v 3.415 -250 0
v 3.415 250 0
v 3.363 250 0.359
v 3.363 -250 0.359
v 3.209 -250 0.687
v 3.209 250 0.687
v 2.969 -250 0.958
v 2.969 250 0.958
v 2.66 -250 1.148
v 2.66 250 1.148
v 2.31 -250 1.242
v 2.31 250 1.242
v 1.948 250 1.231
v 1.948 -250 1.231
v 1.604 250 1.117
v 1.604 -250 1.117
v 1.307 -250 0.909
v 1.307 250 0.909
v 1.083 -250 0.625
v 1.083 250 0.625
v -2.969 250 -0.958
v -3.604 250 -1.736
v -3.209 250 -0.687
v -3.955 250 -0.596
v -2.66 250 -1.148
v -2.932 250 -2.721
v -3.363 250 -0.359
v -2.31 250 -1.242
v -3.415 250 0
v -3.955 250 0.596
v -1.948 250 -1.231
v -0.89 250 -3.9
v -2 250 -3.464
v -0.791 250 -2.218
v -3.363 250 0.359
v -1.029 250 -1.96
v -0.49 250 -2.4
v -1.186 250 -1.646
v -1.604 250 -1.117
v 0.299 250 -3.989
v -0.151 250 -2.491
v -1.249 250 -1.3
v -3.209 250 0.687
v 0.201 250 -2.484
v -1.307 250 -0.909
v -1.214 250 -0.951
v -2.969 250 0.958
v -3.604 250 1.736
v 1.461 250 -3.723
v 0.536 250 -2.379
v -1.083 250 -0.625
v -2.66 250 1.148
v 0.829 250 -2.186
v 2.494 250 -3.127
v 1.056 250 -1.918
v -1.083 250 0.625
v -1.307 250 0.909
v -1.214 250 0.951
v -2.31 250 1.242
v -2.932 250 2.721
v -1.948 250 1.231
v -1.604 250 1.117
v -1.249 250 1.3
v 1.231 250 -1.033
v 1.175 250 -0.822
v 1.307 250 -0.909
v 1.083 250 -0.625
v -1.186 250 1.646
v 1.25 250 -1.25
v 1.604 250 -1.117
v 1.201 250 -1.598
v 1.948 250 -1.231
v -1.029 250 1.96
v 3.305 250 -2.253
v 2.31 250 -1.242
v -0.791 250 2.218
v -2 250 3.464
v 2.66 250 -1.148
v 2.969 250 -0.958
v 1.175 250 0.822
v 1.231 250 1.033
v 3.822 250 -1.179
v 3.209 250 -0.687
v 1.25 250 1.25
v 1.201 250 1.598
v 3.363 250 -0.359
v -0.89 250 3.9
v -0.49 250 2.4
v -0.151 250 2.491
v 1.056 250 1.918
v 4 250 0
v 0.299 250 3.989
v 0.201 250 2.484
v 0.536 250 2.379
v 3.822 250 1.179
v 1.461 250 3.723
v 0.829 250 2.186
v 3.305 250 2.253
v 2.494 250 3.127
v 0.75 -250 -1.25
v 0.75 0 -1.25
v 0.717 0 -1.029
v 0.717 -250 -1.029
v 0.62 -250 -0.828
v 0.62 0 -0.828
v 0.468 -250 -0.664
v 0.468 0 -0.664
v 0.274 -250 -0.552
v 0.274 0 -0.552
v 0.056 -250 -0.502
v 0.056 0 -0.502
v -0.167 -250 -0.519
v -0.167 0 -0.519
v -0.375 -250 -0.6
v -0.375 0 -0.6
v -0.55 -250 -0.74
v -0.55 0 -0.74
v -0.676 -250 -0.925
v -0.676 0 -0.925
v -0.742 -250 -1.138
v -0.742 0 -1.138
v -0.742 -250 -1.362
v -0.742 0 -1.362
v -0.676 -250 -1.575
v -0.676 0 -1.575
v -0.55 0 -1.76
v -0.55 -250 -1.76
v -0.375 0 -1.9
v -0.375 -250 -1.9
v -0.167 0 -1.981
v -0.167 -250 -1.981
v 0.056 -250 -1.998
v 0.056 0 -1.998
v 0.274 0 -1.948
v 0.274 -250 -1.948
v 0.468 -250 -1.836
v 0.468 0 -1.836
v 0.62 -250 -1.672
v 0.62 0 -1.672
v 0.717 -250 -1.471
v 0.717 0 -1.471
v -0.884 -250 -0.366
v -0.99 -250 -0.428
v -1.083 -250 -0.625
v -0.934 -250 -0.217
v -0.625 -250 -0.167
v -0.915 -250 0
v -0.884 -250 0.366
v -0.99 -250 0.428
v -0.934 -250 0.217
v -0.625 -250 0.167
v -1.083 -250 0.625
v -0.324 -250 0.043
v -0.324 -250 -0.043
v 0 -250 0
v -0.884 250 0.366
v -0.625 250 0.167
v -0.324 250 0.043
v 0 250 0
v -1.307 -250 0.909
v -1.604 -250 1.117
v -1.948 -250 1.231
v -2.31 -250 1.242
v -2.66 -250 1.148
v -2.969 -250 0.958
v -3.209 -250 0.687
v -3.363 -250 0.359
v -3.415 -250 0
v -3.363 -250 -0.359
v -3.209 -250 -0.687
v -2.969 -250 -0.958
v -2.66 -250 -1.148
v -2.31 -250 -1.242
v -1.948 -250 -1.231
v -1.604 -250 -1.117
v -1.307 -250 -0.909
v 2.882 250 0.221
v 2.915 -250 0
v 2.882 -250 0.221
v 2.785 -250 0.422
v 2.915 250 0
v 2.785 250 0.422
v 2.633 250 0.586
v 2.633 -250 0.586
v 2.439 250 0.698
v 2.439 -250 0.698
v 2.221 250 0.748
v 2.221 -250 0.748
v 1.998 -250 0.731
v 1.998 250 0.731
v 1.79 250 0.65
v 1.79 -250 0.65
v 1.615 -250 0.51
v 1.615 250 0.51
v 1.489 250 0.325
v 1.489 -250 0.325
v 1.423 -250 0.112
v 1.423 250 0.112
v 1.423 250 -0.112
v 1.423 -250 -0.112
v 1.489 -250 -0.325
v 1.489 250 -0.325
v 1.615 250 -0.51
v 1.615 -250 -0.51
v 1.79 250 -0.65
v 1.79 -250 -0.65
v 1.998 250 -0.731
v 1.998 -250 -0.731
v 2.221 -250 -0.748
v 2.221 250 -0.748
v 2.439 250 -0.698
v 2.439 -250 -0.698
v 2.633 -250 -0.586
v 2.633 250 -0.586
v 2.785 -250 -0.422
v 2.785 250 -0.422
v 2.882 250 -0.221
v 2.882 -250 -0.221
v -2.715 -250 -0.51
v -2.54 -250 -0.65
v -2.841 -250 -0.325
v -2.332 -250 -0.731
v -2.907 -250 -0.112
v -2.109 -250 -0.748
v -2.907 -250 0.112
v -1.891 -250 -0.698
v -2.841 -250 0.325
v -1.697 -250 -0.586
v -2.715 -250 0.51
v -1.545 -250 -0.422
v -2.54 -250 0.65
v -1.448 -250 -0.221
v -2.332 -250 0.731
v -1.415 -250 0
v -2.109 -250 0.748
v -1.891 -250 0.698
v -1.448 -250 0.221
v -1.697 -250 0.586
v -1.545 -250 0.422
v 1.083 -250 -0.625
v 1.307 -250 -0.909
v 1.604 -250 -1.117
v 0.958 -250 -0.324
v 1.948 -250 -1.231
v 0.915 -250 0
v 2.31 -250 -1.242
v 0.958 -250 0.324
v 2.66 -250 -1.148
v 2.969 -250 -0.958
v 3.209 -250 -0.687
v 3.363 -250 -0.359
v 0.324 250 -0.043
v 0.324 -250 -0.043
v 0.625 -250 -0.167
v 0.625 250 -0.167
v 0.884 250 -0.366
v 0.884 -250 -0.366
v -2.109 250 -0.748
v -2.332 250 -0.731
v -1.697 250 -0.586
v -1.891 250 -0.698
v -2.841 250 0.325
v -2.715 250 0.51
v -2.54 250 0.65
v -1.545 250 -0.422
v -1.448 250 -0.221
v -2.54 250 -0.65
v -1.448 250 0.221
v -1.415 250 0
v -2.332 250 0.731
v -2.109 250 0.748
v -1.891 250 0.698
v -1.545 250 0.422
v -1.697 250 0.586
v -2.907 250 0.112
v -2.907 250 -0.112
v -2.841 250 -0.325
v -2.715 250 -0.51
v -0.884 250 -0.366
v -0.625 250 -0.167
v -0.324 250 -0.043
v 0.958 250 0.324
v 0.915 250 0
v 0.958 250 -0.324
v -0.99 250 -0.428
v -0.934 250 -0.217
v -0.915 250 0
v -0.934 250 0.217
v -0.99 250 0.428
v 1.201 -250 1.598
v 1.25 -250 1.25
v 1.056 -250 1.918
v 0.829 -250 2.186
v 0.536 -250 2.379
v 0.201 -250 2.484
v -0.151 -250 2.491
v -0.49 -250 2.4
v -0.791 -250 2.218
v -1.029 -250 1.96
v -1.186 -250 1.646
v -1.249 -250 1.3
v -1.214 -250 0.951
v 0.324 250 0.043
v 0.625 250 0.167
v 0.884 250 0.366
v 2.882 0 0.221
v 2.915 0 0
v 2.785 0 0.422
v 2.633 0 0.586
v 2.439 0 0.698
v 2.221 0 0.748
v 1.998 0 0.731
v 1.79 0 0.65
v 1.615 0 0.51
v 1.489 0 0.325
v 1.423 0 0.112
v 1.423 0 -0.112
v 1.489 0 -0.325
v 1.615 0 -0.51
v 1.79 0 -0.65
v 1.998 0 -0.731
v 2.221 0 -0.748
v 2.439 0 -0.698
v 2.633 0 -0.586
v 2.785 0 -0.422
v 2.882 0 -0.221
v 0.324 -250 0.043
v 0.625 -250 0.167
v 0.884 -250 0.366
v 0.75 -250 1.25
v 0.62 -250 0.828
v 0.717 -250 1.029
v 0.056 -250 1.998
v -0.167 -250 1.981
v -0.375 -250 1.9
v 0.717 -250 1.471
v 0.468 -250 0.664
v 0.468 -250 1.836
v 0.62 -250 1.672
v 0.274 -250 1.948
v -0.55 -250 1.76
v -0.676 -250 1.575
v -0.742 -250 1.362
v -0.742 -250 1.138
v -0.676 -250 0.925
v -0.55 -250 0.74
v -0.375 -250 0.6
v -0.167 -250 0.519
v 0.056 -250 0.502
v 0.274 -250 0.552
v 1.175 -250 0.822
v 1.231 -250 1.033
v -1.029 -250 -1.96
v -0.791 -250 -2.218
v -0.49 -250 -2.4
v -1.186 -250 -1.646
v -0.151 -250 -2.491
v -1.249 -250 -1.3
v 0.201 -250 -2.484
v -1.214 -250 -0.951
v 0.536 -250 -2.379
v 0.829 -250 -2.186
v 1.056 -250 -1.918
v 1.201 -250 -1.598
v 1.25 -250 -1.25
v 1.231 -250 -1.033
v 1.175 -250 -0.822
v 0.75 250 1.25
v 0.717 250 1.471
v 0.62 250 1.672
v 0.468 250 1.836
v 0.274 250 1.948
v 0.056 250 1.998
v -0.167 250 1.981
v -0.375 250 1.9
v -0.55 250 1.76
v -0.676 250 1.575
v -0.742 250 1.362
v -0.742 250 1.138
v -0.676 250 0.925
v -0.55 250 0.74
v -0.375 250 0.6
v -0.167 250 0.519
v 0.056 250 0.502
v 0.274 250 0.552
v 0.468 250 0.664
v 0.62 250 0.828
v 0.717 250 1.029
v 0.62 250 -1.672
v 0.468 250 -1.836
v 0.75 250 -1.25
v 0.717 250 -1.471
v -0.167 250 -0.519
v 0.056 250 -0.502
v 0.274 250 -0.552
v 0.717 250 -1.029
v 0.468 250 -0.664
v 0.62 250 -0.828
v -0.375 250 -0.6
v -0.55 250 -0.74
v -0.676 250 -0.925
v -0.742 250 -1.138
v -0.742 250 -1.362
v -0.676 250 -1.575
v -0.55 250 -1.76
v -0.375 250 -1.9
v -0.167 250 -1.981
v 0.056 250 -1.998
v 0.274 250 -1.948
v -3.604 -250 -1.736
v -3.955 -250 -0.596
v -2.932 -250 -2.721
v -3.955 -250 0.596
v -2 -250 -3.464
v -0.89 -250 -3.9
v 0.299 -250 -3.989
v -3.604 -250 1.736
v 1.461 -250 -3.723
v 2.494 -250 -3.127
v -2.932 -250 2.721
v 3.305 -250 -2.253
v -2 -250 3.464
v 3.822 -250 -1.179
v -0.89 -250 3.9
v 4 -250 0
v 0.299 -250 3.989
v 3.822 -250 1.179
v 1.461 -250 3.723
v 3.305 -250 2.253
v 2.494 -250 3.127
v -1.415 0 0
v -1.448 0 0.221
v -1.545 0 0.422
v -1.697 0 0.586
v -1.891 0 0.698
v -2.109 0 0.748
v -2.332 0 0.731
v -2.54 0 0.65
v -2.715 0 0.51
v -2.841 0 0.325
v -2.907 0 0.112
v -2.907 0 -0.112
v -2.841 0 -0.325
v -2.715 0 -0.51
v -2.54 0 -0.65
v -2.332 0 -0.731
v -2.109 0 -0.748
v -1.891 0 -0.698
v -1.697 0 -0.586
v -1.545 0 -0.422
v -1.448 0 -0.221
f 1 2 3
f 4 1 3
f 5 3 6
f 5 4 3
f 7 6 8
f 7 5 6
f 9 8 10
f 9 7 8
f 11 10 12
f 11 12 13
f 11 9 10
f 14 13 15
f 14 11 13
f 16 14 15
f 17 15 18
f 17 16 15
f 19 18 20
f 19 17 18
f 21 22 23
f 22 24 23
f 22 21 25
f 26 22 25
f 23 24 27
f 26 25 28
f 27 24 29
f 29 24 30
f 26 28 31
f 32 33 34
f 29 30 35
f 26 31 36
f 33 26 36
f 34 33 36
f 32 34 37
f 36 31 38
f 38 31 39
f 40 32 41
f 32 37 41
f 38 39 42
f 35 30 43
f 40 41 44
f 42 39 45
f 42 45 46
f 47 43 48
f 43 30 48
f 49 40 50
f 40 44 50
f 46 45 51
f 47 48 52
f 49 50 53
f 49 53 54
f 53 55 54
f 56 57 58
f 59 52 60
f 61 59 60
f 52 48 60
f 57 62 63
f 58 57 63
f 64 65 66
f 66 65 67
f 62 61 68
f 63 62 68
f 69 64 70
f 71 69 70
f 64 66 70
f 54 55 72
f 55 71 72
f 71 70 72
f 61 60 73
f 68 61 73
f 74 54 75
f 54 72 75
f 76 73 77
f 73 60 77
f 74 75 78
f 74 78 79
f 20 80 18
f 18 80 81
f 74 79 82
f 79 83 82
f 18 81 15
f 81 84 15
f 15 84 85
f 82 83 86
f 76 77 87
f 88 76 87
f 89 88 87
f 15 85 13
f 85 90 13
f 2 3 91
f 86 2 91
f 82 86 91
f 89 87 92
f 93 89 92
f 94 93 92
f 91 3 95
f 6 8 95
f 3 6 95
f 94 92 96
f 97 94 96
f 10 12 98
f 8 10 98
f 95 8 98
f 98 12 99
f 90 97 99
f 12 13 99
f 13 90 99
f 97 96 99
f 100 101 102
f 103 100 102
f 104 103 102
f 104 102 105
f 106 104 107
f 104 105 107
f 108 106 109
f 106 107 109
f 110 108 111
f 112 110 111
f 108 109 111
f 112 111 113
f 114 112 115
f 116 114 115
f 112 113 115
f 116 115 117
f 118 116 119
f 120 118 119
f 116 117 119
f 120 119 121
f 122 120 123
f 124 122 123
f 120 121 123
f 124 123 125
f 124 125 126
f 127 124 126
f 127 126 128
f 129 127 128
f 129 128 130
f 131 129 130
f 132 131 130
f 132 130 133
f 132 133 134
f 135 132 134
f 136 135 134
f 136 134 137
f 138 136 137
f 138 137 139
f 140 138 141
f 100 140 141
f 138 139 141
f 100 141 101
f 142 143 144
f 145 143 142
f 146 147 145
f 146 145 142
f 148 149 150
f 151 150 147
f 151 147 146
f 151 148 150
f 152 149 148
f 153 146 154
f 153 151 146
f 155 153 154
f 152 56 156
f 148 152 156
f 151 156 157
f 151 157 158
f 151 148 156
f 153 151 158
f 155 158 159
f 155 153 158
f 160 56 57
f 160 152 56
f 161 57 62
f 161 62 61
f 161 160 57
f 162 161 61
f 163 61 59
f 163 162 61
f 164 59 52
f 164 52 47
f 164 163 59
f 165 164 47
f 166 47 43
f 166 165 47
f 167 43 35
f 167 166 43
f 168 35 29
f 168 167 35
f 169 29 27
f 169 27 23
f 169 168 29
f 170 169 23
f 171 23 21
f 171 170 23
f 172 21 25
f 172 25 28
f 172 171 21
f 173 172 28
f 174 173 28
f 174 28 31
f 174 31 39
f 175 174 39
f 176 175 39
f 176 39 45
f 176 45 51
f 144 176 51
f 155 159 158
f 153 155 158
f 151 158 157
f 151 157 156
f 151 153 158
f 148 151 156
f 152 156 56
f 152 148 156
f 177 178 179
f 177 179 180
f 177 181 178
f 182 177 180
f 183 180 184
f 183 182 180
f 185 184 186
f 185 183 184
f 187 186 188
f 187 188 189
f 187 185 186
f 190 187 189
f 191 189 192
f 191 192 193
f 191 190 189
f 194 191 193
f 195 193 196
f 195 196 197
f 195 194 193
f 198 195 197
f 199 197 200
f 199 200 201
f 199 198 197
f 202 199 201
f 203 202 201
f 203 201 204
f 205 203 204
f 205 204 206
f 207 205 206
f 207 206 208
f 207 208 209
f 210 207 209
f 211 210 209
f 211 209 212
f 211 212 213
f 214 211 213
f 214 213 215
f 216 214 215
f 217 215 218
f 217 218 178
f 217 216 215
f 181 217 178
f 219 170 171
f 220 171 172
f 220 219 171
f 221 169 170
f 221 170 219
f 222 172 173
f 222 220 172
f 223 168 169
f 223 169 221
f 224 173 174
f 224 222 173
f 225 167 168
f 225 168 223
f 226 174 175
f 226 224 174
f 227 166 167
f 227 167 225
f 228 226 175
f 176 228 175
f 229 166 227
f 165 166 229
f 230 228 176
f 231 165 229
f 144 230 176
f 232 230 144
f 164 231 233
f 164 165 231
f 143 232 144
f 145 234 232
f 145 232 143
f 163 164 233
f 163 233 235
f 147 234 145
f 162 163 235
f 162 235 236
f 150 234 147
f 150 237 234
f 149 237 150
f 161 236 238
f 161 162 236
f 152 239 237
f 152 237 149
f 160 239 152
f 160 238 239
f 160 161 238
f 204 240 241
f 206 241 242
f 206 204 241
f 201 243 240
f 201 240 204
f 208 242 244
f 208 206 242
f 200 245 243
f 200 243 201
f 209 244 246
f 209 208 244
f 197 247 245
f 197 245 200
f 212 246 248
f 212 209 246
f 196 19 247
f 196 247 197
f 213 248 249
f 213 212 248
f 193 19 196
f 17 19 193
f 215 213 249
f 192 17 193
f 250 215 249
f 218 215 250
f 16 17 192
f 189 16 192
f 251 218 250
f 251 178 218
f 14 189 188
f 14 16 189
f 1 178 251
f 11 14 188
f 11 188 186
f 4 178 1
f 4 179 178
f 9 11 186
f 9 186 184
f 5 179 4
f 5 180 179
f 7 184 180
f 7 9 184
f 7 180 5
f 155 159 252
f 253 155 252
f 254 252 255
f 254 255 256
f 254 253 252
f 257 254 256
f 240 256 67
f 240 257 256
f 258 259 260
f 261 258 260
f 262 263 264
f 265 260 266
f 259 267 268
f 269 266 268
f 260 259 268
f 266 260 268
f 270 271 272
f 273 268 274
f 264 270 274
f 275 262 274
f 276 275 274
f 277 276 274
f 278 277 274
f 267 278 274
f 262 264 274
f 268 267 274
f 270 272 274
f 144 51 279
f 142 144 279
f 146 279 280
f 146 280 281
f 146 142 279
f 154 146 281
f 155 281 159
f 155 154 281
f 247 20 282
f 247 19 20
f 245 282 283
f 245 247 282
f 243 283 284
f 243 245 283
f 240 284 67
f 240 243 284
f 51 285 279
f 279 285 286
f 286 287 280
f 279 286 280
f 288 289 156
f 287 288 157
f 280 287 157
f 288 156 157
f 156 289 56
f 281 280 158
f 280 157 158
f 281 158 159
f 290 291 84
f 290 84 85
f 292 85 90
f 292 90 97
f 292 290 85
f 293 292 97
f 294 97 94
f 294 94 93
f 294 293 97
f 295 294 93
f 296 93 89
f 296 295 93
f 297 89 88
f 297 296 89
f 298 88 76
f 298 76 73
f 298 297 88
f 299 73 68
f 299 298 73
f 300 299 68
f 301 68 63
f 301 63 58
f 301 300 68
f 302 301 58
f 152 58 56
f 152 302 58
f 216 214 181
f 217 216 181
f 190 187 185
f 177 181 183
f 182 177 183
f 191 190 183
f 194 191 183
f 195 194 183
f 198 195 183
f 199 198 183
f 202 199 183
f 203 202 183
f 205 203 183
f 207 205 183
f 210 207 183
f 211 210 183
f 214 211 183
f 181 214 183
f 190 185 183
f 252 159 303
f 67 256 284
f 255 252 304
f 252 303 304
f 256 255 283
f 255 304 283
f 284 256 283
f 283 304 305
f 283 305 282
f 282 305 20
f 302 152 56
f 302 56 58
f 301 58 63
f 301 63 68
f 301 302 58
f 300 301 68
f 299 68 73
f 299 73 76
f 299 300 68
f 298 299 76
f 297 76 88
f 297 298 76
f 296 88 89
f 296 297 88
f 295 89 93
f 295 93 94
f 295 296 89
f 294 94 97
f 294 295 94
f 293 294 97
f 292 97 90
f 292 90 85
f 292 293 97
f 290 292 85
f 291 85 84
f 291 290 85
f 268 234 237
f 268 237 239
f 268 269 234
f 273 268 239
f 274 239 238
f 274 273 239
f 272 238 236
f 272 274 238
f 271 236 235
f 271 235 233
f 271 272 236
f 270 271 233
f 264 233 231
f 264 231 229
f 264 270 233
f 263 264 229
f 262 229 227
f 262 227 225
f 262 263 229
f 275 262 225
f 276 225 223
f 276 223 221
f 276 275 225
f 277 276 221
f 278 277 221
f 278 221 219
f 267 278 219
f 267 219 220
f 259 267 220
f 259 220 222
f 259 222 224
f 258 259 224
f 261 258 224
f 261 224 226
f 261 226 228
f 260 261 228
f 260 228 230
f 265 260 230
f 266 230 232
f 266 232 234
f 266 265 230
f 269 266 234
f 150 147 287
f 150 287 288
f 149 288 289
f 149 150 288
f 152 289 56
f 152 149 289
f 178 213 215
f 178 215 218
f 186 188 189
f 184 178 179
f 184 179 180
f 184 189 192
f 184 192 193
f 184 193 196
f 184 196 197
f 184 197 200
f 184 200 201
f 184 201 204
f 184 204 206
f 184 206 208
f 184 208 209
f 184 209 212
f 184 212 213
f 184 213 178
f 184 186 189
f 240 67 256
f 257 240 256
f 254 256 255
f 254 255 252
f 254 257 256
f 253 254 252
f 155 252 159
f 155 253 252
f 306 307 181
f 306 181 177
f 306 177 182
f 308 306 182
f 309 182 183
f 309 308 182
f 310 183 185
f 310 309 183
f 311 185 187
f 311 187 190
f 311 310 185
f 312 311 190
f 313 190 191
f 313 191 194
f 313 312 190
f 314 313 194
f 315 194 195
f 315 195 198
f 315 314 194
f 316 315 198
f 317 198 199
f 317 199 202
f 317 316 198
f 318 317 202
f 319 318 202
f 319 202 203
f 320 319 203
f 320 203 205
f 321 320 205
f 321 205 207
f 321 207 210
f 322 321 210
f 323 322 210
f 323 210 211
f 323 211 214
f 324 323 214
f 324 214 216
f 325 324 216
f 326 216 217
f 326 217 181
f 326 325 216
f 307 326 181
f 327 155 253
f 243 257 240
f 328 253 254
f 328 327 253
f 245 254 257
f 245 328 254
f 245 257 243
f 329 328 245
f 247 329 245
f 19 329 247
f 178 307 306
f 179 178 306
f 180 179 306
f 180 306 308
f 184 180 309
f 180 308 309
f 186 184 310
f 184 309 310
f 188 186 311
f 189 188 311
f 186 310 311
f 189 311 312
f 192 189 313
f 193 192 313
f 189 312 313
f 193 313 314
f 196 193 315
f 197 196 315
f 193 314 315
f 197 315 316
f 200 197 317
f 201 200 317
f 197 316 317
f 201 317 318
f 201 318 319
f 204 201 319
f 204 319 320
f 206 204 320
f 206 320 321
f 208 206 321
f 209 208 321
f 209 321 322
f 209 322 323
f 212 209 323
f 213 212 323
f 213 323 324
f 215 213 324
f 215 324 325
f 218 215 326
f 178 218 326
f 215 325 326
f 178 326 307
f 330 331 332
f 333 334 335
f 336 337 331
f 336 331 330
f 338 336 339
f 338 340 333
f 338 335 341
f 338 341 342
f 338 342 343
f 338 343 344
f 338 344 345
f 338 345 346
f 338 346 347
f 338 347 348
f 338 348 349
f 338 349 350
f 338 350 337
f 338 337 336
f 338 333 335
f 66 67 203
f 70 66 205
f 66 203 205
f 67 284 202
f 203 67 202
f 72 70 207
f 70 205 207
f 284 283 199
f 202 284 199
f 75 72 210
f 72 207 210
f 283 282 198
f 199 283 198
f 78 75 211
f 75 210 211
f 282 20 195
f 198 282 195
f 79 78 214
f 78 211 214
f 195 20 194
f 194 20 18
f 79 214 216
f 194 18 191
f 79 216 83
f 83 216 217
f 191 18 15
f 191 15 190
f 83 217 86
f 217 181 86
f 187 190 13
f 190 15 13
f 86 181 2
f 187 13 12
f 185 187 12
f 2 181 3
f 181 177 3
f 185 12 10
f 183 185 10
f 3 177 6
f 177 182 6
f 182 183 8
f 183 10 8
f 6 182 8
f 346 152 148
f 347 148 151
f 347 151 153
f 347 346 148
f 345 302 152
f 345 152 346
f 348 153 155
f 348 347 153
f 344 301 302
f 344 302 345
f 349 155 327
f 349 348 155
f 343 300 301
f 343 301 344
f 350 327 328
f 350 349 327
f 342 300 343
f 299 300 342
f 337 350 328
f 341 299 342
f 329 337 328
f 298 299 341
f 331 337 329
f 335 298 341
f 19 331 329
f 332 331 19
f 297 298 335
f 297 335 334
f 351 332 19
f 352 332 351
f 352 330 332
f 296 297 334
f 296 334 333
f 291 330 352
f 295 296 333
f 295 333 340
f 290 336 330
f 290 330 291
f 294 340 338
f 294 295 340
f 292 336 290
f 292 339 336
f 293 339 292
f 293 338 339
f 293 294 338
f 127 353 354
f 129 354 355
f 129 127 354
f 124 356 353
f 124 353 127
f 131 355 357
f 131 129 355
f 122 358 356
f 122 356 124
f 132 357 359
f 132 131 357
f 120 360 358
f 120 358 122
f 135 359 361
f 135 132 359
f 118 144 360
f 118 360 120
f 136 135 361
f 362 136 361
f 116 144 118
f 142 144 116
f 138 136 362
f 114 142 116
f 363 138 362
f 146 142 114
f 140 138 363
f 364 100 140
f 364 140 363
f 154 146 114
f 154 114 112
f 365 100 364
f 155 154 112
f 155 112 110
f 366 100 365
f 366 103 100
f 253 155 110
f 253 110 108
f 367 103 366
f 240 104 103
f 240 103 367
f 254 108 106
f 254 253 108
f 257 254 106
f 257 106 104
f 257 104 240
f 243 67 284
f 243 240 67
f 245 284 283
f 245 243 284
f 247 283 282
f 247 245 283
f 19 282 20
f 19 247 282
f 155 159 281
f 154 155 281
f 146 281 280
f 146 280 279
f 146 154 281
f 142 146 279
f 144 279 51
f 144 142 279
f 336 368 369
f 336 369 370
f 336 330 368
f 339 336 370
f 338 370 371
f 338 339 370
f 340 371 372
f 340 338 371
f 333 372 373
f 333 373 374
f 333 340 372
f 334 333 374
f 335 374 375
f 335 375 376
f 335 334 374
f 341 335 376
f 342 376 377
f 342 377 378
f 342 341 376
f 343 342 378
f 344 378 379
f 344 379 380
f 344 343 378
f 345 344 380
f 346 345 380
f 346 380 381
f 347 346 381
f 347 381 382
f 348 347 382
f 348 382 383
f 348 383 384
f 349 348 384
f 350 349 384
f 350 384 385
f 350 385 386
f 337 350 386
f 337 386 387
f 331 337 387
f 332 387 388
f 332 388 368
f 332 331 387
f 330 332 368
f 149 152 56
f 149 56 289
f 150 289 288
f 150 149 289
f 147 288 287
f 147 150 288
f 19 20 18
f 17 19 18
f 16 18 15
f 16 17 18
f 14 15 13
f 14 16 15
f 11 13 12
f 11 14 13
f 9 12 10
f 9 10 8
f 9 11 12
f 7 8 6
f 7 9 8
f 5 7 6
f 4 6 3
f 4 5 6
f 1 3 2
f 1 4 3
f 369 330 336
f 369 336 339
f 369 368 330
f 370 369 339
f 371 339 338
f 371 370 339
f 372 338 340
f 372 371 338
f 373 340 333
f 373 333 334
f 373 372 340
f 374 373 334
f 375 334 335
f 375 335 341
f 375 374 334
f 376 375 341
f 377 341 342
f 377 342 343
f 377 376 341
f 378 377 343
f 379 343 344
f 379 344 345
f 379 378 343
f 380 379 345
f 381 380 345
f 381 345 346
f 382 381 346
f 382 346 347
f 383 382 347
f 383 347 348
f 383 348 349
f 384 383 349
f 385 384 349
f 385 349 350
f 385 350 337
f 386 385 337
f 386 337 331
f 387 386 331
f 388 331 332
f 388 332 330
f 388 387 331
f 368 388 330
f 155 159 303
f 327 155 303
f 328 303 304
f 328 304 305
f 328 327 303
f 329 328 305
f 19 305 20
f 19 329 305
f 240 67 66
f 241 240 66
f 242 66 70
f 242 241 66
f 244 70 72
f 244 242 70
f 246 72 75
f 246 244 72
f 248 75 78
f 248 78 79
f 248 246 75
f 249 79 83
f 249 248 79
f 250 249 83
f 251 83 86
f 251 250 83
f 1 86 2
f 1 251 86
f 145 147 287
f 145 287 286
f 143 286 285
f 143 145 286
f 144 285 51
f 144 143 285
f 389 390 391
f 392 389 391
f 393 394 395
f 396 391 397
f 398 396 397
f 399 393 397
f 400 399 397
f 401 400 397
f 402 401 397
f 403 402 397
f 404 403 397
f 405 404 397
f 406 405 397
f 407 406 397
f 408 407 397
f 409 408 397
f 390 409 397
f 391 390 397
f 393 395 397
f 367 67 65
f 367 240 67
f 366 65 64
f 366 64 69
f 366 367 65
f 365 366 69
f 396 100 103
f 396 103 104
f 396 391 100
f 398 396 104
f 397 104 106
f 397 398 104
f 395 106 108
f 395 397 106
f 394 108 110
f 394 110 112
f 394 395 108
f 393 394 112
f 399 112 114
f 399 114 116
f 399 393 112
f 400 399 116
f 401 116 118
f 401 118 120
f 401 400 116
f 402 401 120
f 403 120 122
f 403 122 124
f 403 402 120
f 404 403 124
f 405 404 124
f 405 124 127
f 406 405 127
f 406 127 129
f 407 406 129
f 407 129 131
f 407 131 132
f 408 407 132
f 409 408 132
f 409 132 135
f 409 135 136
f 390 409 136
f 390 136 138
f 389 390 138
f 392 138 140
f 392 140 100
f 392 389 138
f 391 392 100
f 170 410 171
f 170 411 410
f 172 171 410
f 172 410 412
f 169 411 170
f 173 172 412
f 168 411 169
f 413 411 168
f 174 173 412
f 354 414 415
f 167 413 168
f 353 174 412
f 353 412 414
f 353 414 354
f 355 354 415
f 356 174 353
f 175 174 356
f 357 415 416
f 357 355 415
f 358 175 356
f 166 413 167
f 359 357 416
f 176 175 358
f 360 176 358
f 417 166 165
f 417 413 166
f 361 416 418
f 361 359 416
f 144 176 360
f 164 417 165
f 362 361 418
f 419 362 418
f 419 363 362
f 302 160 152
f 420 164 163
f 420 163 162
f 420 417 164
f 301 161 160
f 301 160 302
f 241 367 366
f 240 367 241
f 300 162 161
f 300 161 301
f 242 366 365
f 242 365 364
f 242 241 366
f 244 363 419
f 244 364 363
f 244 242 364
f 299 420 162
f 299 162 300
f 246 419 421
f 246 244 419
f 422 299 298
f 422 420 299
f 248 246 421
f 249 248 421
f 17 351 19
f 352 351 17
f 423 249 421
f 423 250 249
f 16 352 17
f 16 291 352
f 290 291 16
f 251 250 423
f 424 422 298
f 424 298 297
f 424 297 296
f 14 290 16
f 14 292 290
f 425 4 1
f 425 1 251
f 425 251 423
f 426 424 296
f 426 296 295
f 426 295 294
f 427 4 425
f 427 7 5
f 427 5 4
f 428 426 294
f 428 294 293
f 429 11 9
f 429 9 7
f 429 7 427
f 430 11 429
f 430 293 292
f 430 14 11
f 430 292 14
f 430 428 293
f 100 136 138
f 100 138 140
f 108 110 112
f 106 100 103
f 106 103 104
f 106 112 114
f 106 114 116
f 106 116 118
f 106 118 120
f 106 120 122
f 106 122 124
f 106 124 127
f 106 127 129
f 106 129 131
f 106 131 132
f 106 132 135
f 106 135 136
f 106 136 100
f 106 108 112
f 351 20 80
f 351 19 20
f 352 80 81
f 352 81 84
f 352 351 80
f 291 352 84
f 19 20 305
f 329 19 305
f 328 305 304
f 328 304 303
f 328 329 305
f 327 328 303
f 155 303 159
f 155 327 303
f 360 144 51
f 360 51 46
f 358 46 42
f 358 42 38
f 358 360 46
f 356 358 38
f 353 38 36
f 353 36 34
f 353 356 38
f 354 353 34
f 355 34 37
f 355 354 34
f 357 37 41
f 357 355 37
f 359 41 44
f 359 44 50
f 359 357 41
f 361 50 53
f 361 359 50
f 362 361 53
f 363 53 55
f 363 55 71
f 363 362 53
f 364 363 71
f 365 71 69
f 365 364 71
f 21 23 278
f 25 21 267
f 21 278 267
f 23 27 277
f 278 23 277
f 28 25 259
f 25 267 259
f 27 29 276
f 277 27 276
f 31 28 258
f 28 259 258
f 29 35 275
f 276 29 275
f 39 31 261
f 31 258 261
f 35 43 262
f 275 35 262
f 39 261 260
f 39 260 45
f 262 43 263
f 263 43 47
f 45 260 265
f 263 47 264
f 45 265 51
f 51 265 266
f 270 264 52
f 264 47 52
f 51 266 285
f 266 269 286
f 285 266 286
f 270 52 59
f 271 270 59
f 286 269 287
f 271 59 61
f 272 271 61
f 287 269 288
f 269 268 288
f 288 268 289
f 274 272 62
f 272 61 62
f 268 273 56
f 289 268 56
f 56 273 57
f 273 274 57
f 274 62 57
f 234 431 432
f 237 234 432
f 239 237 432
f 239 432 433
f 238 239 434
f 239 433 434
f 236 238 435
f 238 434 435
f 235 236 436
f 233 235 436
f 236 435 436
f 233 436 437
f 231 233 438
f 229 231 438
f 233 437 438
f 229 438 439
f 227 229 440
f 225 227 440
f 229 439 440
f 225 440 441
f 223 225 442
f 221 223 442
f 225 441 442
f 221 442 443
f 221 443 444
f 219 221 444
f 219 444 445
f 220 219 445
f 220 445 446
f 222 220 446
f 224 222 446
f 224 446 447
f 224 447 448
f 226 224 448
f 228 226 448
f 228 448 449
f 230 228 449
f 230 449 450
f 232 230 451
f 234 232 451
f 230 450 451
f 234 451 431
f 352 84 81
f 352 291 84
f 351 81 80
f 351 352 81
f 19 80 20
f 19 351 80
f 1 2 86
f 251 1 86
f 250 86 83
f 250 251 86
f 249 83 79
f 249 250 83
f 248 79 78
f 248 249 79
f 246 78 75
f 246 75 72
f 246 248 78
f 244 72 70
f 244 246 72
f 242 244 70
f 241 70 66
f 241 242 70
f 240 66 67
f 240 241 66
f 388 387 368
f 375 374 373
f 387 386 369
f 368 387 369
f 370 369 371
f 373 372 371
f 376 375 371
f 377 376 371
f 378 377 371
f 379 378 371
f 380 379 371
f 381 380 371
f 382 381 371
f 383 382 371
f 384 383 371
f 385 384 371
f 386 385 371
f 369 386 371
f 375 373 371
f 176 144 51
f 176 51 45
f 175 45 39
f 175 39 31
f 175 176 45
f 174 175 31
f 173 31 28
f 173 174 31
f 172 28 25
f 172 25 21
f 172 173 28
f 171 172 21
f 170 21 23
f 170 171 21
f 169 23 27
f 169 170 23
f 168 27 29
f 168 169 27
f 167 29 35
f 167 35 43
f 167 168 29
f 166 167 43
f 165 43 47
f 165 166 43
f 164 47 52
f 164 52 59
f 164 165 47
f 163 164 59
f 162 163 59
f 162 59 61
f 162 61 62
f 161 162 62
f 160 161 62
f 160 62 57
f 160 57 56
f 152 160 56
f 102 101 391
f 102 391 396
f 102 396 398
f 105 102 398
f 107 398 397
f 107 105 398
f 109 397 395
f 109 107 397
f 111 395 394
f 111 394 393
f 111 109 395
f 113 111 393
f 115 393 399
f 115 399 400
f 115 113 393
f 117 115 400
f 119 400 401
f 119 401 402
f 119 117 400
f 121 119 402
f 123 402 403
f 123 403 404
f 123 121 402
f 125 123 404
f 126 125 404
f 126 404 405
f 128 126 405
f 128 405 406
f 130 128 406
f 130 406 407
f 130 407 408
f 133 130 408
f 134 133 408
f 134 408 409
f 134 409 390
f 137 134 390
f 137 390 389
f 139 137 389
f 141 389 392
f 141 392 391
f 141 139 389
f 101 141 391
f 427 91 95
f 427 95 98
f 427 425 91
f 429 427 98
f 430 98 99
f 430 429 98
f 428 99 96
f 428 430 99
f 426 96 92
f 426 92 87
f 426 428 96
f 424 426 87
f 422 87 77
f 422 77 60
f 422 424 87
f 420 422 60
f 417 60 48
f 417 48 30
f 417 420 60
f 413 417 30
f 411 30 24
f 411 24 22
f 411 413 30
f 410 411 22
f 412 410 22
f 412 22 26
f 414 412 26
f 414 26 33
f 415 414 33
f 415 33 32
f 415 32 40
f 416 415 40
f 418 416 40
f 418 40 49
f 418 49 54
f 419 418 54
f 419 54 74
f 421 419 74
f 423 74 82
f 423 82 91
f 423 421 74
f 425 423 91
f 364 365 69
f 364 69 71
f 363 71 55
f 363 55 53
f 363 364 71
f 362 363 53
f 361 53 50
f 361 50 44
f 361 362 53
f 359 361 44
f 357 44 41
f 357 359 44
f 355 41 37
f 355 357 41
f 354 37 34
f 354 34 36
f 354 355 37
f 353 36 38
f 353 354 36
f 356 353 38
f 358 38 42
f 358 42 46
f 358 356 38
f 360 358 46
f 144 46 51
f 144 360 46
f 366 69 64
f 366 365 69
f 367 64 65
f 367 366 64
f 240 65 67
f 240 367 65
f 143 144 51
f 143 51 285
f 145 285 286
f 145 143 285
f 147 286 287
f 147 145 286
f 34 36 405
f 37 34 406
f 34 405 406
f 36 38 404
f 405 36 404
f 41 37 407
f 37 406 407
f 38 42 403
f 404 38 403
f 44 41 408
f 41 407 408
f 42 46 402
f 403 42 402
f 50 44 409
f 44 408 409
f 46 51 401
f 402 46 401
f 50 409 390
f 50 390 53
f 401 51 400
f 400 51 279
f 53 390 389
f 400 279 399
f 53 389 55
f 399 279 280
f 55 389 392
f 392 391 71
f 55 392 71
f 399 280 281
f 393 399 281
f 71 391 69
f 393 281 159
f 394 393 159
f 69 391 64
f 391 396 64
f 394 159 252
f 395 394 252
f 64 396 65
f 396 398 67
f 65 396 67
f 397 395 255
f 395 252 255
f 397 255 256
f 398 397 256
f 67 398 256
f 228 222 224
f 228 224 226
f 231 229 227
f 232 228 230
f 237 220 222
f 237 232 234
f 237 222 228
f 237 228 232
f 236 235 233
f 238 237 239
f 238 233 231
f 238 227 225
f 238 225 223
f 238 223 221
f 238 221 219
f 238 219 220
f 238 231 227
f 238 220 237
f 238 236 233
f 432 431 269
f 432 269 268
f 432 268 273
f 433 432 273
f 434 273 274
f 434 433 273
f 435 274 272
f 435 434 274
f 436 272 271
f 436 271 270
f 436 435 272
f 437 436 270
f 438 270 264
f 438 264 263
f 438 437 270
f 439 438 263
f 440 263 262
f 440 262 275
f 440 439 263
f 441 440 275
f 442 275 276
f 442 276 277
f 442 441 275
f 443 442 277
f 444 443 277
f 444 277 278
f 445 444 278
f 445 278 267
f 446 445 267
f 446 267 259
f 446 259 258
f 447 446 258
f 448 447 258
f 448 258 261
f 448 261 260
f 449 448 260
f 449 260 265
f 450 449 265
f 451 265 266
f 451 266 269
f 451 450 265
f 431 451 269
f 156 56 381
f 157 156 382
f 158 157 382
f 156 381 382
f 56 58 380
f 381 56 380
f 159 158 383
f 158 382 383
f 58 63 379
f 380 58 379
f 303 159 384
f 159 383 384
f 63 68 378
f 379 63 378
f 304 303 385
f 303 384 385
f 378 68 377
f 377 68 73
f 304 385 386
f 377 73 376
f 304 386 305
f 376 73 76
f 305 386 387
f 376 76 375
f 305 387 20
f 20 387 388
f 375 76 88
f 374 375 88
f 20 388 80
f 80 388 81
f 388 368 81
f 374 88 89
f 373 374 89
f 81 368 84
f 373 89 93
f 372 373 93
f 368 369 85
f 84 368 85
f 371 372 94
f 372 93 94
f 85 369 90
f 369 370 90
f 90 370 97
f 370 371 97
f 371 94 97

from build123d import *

# Parameters (mm, degrees)
F0_R     = 4
F1_DEPTH = 250
F0_R_2   = 0.75
F2_DEPTH = 250
F3_DEPTH = 250


with BuildPart() as f1:
    # F0 (on Front) → F1 (new body, symmetric)
    with BuildSketch(Plane.XZ):
        Circle(F0_R)
        with BuildLine():
            ThreePointArc((-1.082532, 0.625), (-0.323524, 2.457407), (1.25, 1.25))
            ThreePointArc((1.25, 1.25), (1.207407, 0.926476), (1.082532, 0.625))
            ThreePointArc((1.082532, 0.625), (2.488587, 1.207407), (3.415064, 0))
            ThreePointArc((3.415064, 0), (2.488587, -1.207407), (1.082532, -0.625))
            ThreePointArc((1.082532, -0.625), (1.207407, -0.926476), (1.25, -1.25))
            ThreePointArc((1.25, -1.25), (-0.323524, -2.457407), (-1.082532, -0.625))
            ThreePointArc((-1.082532, -0.625), (-3.415064, 0), (-1.082532, 0.625))
        make_face(mode=Mode.SUBTRACT)
        with BuildLine():
            ThreePointArc((0, 0), (-0.625, 0.167468), (-1.082532, 0.625))
            ThreePointArc((-1.082532, 0.625), (-0.957656, 0.323524), (-0.915064, 0))
            ThreePointArc((-0.915064, 0), (-0.957656, -0.323524), (-1.082532, -0.625))
            ThreePointArc((-1.082532, -0.625), (-0.625, -0.167468), (0, 0))
        make_face()
        with BuildLine():
            ThreePointArc((1.082532, -0.625), (0.915064, 0), (1.082532, 0.625))
            ThreePointArc((1.082532, 0.625), (0.625, 0.167468), (0, 0))
            ThreePointArc((0, 0), (0.625, -0.167468), (1.082532, -0.625))
        make_face()
    extrude(amount=F1_DEPTH, both=True)


with BuildPart() as f2:
    # F0 (on Front) → F2 (new body, symmetric)
    with BuildSketch(Plane.XZ):
        with BuildLine():
            ThreePointArc((-0.915064, 0), (-0.957656, 0.323524), (-1.082532, 0.625))
            ThreePointArc((-1.082532, 0.625), (-3.415064, 0), (-1.082532, -0.625))
            ThreePointArc((-1.082532, -0.625), (-0.957656, -0.323524), (-0.915064, 0))
        make_face()
        with Locations((-2.165064, 0)):
            Circle(F0_R_2, mode=Mode.SUBTRACT)
        with BuildLine():
            ThreePointArc((1.082532, 0.625), (1.207407, 0.926476), (1.25, 1.25))
            ThreePointArc((1.25, 1.25), (-0.323524, 2.457407), (-1.082532, 0.625))
            ThreePointArc((-1.082532, 0.625), (-0.625, 0.167468), (0, 0))
            ThreePointArc((0, 0), (0.625, 0.167468), (1.082532, 0.625))
        make_face()
        with Locations((0, 1.25)):
            Circle(F0_R_2, mode=Mode.SUBTRACT)
        with BuildLine():
            ThreePointArc((3.415064, 0), (2.488587, 1.207407), (1.082532, 0.625))
            ThreePointArc((1.082532, 0.625), (0.915064, 0), (1.082532, -0.625))
            ThreePointArc((1.082532, -0.625), (2.488587, -1.207407), (3.415064, 0))
        make_face()
        with Locations((2.165064, 0)):
            Circle(F0_R_2, mode=Mode.SUBTRACT)
        with BuildLine():
            ThreePointArc((1.082532, -0.625), (0.625, -0.167468), (0, 0))
            ThreePointArc((0, 0), (-0.625, -0.167468), (-1.082532, -0.625))
            ThreePointArc((-1.082532, -0.625), (-0.323524, -2.457407), (1.25, -1.25))
            ThreePointArc((1.25, -1.25), (1.207407, -0.926476), (1.082532, -0.625))
        make_face()
        with Locations((0, -1.25)):
            Circle(F0_R_2, mode=Mode.SUBTRACT)
    extrude(amount=F2_DEPTH, both=True)


with BuildPart() as f3:
    # F0 (on Front) → F3 (new body, symmetric)
    with BuildSketch(Plane.XZ):
        with Locations((-2.165064, 0)):
            Circle(F0_R_2)
        with Locations((0, -1.25)):
            Circle(F0_R_2)
        with Locations((2.165064, 0)):
            Circle(F0_R_2)
        with Locations((0, 1.25)):
            Circle(F0_R_2)
    extrude(amount=F3_DEPTH, both=True)


solid = Compound([f1.part, f2.part, f3.part])
